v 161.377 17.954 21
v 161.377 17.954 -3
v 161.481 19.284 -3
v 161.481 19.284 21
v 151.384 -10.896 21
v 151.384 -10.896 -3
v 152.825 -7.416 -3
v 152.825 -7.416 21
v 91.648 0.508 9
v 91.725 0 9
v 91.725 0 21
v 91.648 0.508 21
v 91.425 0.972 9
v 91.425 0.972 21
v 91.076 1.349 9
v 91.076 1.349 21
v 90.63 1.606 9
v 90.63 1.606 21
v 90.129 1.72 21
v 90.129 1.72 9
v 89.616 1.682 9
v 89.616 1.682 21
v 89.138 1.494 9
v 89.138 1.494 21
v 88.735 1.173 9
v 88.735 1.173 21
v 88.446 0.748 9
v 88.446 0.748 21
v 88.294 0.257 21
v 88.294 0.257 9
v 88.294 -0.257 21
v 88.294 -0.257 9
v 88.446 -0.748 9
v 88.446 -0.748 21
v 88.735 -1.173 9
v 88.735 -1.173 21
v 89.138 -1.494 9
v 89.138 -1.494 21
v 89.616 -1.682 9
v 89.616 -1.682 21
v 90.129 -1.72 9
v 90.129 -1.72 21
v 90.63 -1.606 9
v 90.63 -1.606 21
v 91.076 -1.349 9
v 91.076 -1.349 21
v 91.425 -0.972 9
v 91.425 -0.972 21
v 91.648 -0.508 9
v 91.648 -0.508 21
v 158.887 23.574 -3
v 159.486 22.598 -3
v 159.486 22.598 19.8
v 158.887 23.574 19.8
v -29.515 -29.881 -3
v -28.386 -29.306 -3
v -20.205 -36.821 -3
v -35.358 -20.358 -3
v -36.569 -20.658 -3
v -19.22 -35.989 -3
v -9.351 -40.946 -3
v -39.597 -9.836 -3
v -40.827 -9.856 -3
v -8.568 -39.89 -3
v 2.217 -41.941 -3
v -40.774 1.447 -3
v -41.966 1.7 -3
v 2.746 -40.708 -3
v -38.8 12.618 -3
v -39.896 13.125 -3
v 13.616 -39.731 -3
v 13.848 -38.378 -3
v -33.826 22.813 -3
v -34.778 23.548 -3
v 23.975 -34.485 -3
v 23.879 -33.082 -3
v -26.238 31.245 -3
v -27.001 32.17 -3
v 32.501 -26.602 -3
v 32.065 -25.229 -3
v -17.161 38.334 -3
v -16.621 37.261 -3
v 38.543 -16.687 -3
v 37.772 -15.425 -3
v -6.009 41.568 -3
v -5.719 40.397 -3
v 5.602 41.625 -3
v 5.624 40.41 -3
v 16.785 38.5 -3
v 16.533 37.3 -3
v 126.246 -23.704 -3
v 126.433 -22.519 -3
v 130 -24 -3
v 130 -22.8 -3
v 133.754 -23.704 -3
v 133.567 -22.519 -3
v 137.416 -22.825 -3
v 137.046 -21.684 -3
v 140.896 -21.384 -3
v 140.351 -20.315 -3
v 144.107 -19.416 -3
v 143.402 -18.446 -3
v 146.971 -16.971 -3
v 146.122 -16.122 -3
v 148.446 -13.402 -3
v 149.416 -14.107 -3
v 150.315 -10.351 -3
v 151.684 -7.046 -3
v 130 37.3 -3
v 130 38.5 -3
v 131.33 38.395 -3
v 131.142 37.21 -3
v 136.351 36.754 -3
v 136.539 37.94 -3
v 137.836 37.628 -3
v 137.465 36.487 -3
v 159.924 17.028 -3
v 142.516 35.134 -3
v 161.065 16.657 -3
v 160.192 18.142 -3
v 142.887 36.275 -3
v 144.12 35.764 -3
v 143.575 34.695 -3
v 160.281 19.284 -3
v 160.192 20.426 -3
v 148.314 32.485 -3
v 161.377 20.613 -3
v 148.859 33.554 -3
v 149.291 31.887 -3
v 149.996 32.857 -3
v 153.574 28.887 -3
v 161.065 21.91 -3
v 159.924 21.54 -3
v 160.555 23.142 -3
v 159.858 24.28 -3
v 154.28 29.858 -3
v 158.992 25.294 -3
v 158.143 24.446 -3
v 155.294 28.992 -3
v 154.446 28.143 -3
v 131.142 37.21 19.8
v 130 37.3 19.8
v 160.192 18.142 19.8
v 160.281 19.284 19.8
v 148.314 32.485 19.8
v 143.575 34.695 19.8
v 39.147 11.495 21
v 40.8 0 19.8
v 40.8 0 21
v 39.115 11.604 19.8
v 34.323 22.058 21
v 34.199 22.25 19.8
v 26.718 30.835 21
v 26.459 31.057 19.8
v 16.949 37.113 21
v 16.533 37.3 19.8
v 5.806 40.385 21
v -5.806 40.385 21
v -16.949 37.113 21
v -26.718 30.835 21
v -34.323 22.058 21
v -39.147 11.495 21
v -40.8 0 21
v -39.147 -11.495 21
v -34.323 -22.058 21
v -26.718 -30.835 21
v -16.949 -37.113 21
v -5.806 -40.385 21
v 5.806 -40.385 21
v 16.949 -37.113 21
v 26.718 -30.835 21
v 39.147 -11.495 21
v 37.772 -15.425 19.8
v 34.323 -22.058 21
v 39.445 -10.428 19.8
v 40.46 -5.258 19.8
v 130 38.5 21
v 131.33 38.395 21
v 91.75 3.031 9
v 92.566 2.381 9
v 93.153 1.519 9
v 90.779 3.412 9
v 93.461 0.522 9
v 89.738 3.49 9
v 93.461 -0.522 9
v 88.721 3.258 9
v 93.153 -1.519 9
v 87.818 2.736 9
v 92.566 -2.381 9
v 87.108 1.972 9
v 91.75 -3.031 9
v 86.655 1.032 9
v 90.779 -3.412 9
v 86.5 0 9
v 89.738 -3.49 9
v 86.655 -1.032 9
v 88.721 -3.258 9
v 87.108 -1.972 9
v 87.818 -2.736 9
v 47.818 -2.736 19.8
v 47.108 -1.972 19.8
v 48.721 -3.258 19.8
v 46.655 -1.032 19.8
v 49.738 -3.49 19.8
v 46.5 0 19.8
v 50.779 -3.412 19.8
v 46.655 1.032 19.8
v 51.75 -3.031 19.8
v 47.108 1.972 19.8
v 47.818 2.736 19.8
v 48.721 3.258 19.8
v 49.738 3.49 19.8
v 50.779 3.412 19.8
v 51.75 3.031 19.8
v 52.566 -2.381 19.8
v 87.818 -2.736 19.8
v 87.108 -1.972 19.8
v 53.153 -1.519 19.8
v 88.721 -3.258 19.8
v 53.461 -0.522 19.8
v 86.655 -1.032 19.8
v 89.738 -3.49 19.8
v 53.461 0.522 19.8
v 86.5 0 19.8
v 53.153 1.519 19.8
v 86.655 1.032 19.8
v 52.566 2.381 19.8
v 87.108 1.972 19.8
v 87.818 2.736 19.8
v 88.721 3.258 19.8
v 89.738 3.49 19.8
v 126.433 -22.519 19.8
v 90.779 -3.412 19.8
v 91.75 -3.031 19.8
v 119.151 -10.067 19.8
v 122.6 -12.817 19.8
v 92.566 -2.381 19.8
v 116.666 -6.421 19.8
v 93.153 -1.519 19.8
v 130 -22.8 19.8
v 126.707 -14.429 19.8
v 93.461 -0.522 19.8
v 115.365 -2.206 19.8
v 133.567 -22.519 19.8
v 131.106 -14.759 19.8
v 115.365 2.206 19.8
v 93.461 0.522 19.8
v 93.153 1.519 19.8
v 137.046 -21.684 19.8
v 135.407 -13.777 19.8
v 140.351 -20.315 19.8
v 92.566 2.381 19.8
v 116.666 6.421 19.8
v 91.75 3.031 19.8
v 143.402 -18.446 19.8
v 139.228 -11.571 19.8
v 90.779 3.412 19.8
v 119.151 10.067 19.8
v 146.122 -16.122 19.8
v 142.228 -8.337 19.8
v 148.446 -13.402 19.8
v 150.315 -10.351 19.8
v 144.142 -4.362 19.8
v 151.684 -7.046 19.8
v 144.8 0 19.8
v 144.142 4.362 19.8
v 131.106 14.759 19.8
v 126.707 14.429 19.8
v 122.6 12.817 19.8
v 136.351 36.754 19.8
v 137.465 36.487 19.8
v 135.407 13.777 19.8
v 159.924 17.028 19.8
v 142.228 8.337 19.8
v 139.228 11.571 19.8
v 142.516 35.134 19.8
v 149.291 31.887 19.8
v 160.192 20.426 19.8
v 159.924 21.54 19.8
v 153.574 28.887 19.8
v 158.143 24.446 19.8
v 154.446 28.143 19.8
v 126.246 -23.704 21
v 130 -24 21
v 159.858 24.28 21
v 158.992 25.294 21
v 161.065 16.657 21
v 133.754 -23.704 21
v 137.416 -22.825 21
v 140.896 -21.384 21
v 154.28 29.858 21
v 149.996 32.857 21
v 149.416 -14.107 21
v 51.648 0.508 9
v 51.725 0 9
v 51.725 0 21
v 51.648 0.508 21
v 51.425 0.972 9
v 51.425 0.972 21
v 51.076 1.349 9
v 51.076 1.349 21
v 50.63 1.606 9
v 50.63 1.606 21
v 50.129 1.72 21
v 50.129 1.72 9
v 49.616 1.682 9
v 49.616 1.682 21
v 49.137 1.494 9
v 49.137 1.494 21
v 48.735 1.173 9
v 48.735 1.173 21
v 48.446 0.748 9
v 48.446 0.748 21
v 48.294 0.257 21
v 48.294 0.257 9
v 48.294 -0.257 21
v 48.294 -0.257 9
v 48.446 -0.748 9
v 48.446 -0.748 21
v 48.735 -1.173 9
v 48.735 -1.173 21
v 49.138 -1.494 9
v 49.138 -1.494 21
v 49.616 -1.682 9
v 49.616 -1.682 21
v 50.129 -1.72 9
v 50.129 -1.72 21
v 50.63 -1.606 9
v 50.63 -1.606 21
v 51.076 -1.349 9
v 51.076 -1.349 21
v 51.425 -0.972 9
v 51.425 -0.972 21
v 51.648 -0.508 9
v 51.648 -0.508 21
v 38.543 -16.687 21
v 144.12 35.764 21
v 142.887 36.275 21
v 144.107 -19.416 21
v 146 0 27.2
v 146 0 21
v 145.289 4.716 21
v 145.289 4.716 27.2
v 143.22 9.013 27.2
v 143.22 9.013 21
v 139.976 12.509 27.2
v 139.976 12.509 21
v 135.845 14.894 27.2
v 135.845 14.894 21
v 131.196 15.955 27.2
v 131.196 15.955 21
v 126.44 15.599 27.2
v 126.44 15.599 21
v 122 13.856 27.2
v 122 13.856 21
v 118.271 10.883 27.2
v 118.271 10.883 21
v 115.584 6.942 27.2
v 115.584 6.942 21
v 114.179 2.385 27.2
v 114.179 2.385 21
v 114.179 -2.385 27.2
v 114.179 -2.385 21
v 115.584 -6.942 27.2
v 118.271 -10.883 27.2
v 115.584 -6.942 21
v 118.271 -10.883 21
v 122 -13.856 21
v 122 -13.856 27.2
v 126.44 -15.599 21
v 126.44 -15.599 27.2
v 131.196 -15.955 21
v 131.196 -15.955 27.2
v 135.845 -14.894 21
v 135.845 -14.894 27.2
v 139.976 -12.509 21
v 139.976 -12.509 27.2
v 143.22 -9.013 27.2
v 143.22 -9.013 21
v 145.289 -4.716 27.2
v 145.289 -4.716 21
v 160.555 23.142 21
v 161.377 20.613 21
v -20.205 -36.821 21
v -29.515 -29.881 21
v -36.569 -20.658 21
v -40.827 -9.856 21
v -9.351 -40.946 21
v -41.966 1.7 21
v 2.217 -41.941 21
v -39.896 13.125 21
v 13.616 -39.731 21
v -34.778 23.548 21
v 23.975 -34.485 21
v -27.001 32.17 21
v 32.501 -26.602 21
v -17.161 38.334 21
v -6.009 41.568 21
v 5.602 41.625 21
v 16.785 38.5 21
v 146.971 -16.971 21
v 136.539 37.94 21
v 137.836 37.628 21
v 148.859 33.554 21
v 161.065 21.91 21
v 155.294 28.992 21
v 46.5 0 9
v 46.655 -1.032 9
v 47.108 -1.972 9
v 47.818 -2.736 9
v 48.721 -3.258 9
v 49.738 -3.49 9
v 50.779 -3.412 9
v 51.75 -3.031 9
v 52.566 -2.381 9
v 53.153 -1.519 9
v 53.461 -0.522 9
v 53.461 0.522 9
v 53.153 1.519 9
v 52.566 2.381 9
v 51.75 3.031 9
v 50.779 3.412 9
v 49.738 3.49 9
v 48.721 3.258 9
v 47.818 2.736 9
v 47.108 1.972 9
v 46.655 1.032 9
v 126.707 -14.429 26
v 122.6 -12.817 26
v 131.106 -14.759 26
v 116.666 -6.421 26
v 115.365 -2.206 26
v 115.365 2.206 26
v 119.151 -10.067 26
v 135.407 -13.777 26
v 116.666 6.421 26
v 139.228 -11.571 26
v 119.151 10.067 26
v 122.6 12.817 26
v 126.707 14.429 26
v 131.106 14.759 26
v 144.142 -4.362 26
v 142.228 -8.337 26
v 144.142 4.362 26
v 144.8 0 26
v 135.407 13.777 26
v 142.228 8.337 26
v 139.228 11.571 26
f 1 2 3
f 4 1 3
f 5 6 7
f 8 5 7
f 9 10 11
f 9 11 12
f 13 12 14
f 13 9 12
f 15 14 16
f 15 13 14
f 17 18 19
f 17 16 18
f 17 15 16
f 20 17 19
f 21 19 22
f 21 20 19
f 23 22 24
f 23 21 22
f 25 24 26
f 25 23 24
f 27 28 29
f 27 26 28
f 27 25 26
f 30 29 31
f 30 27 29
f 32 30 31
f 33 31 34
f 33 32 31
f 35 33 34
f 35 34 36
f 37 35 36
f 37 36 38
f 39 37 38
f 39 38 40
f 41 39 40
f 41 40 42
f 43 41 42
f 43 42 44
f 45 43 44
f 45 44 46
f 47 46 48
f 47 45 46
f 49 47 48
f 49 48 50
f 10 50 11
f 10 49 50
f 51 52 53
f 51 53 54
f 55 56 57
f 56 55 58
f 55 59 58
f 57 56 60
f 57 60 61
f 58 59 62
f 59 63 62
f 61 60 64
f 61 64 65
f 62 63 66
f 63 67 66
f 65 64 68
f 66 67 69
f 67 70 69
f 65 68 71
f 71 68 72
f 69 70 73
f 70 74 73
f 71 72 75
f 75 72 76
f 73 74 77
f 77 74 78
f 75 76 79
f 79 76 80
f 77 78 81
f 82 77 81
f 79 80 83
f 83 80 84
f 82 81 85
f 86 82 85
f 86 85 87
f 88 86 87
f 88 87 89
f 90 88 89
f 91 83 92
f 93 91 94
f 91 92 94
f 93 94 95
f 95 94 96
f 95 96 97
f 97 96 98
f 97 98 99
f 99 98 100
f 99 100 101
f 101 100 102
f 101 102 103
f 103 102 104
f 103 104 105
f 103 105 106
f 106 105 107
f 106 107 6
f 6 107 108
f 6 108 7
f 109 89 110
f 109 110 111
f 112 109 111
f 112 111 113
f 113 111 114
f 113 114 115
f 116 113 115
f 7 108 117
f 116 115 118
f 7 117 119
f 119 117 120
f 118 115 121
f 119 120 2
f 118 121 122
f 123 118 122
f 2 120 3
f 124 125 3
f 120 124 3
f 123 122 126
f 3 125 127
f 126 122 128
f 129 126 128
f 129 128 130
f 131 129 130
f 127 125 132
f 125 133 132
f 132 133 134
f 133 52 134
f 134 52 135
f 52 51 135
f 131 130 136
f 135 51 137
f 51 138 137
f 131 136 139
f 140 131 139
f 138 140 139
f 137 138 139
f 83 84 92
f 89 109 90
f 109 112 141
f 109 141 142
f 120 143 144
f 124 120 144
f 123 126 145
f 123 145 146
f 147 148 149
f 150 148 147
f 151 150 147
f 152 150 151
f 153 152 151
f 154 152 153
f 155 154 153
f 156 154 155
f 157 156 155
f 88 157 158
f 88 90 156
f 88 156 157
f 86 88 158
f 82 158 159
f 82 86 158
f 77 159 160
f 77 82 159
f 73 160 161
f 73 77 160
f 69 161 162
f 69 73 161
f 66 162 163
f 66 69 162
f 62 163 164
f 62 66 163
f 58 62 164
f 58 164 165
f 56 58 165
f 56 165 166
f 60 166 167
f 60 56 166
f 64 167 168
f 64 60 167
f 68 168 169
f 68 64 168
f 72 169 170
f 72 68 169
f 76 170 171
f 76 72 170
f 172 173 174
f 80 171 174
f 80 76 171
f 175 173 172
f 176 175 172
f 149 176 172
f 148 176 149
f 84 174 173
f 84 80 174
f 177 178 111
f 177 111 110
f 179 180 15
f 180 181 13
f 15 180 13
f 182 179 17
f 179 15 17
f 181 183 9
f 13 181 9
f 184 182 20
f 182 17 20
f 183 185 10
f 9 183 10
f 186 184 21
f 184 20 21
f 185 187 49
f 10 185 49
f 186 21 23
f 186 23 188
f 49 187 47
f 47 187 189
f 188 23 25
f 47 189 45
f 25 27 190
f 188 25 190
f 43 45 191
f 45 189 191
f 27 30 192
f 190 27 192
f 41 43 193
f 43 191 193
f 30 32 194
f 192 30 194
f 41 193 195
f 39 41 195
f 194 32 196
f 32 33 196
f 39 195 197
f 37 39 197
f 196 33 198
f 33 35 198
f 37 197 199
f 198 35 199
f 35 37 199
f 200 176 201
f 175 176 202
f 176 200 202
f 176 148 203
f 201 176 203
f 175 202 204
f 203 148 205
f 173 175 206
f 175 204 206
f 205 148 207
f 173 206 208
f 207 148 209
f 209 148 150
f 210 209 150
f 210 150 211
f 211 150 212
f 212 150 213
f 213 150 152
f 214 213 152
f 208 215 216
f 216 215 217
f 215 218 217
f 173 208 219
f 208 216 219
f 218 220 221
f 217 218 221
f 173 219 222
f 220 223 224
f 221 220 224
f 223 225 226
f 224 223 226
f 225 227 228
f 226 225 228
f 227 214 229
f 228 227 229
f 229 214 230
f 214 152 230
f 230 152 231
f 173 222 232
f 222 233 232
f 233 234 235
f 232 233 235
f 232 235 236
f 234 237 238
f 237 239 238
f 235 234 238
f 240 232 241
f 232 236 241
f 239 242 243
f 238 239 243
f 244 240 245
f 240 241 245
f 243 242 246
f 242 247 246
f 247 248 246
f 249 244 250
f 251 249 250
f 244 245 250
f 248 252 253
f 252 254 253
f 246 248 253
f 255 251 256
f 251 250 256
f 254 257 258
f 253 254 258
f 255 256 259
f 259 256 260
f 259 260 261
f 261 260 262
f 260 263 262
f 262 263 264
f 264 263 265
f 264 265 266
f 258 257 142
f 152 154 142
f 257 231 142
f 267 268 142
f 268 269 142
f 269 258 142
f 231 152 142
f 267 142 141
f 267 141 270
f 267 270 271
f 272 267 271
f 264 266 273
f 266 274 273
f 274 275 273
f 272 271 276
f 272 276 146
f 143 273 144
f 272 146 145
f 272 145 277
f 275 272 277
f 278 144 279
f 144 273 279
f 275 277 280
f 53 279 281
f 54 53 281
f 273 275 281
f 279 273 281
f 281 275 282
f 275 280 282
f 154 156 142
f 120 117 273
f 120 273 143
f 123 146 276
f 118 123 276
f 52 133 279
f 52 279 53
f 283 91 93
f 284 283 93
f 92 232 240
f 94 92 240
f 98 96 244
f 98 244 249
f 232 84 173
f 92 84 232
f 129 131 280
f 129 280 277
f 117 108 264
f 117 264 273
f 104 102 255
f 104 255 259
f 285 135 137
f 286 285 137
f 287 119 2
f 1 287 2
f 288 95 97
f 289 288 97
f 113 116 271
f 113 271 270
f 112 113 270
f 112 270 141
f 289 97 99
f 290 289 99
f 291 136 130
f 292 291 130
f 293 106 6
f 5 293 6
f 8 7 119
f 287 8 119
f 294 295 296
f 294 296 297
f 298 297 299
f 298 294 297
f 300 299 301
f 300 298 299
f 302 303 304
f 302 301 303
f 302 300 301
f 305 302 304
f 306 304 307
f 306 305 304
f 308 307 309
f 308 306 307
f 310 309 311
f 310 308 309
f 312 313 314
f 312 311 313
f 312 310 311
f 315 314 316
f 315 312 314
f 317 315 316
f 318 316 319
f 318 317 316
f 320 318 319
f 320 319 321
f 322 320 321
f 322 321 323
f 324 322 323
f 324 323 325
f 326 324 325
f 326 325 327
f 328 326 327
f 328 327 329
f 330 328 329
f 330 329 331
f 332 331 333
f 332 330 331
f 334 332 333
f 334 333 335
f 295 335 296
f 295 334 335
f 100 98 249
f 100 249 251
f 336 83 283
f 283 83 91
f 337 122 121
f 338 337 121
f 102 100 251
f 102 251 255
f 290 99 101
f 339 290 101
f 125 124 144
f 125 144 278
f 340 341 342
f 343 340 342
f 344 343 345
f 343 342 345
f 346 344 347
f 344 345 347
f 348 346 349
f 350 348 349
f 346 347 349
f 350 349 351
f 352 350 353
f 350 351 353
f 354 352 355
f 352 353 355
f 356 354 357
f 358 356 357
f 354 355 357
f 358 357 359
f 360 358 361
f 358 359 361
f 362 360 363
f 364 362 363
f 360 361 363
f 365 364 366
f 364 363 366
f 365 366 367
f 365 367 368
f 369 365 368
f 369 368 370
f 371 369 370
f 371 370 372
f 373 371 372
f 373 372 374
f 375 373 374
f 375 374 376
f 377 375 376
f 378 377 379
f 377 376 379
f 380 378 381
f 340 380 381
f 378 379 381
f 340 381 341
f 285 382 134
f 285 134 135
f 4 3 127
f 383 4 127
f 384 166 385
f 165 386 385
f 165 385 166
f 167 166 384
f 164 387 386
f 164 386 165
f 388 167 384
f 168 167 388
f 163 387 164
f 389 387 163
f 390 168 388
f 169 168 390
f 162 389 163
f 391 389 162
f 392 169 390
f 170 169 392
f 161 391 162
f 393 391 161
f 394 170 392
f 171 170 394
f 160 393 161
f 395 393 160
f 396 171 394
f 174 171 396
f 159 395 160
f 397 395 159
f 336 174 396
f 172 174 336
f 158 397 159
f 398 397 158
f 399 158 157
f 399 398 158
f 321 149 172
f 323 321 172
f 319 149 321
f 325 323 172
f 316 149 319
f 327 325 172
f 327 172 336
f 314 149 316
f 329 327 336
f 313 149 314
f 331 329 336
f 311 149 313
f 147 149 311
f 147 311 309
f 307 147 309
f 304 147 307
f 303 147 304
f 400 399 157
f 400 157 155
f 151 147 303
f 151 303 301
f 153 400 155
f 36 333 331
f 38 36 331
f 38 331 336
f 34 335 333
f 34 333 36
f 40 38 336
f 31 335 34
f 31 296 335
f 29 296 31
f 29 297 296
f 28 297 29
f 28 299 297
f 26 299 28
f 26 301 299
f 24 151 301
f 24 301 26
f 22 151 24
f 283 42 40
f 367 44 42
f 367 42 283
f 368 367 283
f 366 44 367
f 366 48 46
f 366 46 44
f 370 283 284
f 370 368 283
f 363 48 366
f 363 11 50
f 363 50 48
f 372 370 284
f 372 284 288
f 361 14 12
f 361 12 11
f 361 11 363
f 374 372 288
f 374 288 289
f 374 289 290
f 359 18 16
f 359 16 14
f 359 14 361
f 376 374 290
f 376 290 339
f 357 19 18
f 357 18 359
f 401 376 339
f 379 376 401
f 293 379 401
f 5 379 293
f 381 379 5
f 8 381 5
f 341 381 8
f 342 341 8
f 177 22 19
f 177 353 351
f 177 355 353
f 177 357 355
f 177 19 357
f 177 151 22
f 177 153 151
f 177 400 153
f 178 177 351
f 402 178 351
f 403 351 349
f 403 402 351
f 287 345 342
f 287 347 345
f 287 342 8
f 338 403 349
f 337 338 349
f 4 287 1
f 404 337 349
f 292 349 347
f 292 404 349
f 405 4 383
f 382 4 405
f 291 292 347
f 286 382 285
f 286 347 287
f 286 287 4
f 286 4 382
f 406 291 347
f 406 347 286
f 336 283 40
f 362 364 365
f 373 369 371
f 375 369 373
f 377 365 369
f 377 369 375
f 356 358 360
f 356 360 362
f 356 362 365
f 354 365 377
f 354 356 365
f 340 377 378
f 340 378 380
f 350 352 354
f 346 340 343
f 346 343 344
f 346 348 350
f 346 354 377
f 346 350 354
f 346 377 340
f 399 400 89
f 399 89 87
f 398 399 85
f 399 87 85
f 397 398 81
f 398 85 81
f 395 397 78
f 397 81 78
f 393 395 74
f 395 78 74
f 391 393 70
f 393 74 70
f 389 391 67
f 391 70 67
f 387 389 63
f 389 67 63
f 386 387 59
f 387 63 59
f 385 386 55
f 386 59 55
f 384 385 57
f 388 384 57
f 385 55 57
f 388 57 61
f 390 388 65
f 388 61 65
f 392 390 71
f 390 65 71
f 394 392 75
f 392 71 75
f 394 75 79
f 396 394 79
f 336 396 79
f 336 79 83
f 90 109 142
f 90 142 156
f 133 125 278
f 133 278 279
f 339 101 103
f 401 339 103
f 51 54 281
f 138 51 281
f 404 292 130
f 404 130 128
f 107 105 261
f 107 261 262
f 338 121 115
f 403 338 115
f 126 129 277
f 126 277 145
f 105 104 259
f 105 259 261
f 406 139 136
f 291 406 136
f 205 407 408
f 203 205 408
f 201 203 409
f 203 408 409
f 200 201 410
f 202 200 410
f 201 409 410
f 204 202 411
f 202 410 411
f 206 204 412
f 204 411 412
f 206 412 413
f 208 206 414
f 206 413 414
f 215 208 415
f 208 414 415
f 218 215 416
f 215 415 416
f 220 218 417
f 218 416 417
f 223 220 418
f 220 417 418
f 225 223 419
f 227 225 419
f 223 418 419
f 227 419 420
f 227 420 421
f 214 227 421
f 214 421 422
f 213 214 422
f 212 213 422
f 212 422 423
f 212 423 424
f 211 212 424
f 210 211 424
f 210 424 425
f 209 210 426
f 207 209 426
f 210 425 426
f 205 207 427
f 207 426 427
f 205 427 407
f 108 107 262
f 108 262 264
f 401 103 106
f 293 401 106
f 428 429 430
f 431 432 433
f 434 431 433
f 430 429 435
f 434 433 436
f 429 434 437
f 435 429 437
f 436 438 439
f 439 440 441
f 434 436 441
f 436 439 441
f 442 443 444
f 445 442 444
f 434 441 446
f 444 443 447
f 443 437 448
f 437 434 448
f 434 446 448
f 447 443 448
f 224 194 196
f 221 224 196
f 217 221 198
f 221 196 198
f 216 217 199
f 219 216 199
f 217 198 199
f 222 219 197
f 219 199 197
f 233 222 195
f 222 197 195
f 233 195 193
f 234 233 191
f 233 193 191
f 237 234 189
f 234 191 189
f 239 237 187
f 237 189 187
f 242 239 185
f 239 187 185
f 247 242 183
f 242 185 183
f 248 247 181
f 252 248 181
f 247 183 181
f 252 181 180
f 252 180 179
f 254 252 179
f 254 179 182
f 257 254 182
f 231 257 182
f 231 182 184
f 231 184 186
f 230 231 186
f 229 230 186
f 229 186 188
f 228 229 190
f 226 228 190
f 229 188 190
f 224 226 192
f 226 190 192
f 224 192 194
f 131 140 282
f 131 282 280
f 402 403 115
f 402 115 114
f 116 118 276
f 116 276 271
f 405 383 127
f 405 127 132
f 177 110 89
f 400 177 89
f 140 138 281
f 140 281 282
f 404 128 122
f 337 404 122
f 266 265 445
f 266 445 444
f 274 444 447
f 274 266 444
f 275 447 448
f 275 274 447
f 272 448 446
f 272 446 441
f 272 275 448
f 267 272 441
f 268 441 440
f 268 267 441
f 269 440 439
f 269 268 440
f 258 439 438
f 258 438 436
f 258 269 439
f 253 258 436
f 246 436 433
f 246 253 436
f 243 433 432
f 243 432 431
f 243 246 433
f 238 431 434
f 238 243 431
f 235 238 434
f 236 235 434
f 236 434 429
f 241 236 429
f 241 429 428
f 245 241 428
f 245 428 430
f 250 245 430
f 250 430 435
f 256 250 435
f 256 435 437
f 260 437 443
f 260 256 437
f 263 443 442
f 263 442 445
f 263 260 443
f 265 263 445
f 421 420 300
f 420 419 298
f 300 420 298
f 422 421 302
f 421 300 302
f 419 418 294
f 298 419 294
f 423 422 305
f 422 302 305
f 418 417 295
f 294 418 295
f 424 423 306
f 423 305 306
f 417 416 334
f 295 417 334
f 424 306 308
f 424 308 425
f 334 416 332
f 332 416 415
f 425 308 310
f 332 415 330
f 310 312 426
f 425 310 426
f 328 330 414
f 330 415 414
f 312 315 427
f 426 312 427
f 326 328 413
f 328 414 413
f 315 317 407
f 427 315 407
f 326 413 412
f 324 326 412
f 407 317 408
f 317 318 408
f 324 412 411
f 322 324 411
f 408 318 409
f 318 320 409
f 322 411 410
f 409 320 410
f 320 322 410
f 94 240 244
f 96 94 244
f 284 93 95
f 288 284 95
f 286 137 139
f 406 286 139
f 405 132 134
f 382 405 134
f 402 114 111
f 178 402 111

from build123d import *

# Parameters (mm, degrees)
BOSS_EXTRUDE1_START     = -3
SKETCH1_R               = 42
BOSS_EXTRUDE1_DEPTH     = 24
BOSS_EXTRUDE2_START     = -3
BOSS_EXTRUDE2_DEPTH     = 24
CUT_EXTRUDE1_START      = -3
CUT_EXTRUDE1_DEPTH      = 22.8
CUT_EXTRUDE2_DEPTH      = 169.170182404
CUT_EXTRUDE2_DEPTH_BACK = 169.170182404
SKETCH4_R               = 40.8
BOSS_EXTRUDE3_START     = 21
SKETCH5_R               = 16
BOSS_EXTRUDE3_DEPTH     = 6.2
CUT_EXTRUDE3_START      = 19.8
SKETCH6_R               = 14.8
CUT_EXTRUDE3_DEPTH      = 6.2
BOSS_EXTRUDE4_START     = 9
SKETCH7_R               = 3.5
BOSS_EXTRUDE4_DEPTH     = 10.8
CUT_EXTRUDE4_DEPTH      = 170.05635229
CUT_EXTRUDE4_DEPTH_BACK = 170.05635229
SKETCH8_R               = 1.725


with BuildPart() as part:
    # Sketch1 → Boss-Extrude1 (new body)
    with BuildSketch(Plane.XY.offset(BOSS_EXTRUDE1_START)):
        Circle(SKETCH1_R)
    extrude(amount=BOSS_EXTRUDE1_DEPTH)

    # Sketch2 → Boss-Extrude2 (add)
    with BuildSketch(Plane.XY.offset(BOSS_EXTRUDE2_START)):
        Polygon((-38.5, 0), (-38.3954, -1.3297), (-38.084, -2.6266), (-37.5736, -3.8589), (-36.8766, -4.9962), (-36.0104, -6.0104), (-34.9962, -6.8766), (-33.8589, -7.5736), (-32.6266, -8.084), (-31.3297, -8.3954), (27.497, -15.803), (126.2456, -23.7045), (130, -24), (133.7544, -23.7045), (137.4164, -22.8254), (140.8958, -21.3842), (144.1068, -19.4164), (146.9706, -16.9706), (149.4164, -14.1068), (151.3842, -10.8958), (152.8254, -7.4164), (161.0653, 16.657), (161.3767, 17.9539), (161.4813, 19.2836), (161.3767, 20.6133), (161.0653, 21.9103), (160.5549, 23.1425), (159.858, 24.2798), (158.9917, 25.294), (155.294, 28.9917), (154.2798, 29.858), (149.9962, 32.8574), (148.8589, 33.5543), (144.1195, 35.7643), (142.8872, 36.2748), (137.8361, 37.6282), (136.5391, 37.9396), (131.3297, 38.3954), (130, 38.5), (0, 38.5), (-1.3297, 38.3954), (-6.5391, 37.9396), (-7.8361, 37.6282), (-12.8872, 36.2748), (-14.1195, 35.7643), (-18.8589, 33.5543), (-19.9962, 32.8574), (-24.2798, 29.858), (-25.294, 28.9917), (-28.9917, 25.294), (-29.858, 24.2798), (-32.8574, 19.9962), (-33.5543, 18.8589), (-35.7643, 14.1195), (-36.2748, 12.8872), (-37.6282, 7.8361), (-37.9396, 6.5391), (-38.3954, 1.3297), align=None)
    extrude(amount=BOSS_EXTRUDE2_DEPTH)

    # Sketch3 → Cut-Extrude1 (cut)
    with BuildSketch(Plane.XY.offset(CUT_EXTRUDE1_START)):
        Polygon((-37.3, 0), (-37.2101, -1.142), (-36.9427, -2.2558), (-36.5043, -3.3141), (-35.9058, -4.2908), (-35.1619, -5.1619), (-34.2908, -5.9058), (-33.3141, -6.5043), (-32.2558, -6.9427), (-31.142, -7.2101), (27.6848, -14.6178), (126.4333, -22.5193), (130, -22.8), (133.5667, -22.5193), (137.0456, -21.6841), (140.351, -20.3149), (143.4015, -18.4456), (146.122, -16.122), (148.4456, -13.4015), (150.3149, -10.351), (151.6841, -7.0456), (159.924, 17.0278), (160.1915, 18.1417), (160.2813, 19.2836), (160.1915, 20.4256), (159.924, 21.5395), (159.4857, 22.5978), (158.8872, 23.5745), (158.1432, 24.4455), (154.4455, 28.1432), (153.5745, 28.8872), (149.2908, 31.8866), (148.3141, 32.4851), (143.5747, 34.6951), (142.5164, 35.1335), (137.4653, 36.4869), (136.3514, 36.7544), (131.142, 37.2101), (130, 37.3), (0, 37.3), (-1.142, 37.2101), (-6.3514, 36.7544), (-7.4653, 36.4869), (-12.5164, 35.1335), (-13.5747, 34.6951), (-18.3141, 32.4851), (-19.2908, 31.8866), (-23.5745, 28.8872), (-24.4455, 28.1432), (-28.1432, 24.4455), (-28.8872, 23.5745), (-31.8866, 19.2908), (-32.4851, 18.3141), (-34.6951, 13.5747), (-35.1335, 12.5164), (-36.4869, 7.4653), (-36.7544, 6.3514), (-37.2101, 1.142), align=None)
    extrude(amount=CUT_EXTRUDE1_DEPTH, mode=Mode.SUBTRACT)

    # Sketch4 → Cut-Extrude2 (cut, two sides: drawn at the far end of the back side and taken through both)
    with BuildSketch(Plane.XY.offset(-CUT_EXTRUDE2_DEPTH_BACK)):
        Circle(SKETCH4_R)
    extrude(amount=CUT_EXTRUDE2_DEPTH + CUT_EXTRUDE2_DEPTH_BACK, mode=Mode.SUBTRACT)

    # Sketch5 → Boss-Extrude3 (add)
    with BuildSketch(Plane.XY.offset(BOSS_EXTRUDE3_START)):
        with Locations((130, 0)):
            Circle(SKETCH5_R)
    extrude(amount=BOSS_EXTRUDE3_DEPTH)

    # Sketch6 → Cut-Extrude3 (cut)
    with BuildSketch(Plane.XY.offset(CUT_EXTRUDE3_START)):
        with Locations((130, 0)):
            Circle(SKETCH6_R)
    extrude(amount=CUT_EXTRUDE3_DEPTH, mode=Mode.SUBTRACT)

    # Sketch7 → Boss-Extrude4 (add)
    with BuildSketch(Plane.XY.offset(BOSS_EXTRUDE4_START)):
        with Locations(Location((50, 0, 0), (0, 0, 180))):
            Circle(SKETCH7_R)
        with Locations(Location((90, 0, 0), (0, 0, 180))):
            Circle(SKETCH7_R)
    extrude(amount=BOSS_EXTRUDE4_DEPTH)

    # Sketch8 → Cut-Extrude4 (cut, two sides: drawn at the far end of the back side and taken through both)
    with BuildSketch(Plane.XY.offset(-CUT_EXTRUDE4_DEPTH_BACK)):
        with Locations((50, 0)):
            Circle(SKETCH8_R)
        with Locations((90, 0)):
            Circle(SKETCH8_R)
    extrude(amount=CUT_EXTRUDE4_DEPTH + CUT_EXTRUDE4_DEPTH_BACK, mode=Mode.SUBTRACT)


solid = part.part
